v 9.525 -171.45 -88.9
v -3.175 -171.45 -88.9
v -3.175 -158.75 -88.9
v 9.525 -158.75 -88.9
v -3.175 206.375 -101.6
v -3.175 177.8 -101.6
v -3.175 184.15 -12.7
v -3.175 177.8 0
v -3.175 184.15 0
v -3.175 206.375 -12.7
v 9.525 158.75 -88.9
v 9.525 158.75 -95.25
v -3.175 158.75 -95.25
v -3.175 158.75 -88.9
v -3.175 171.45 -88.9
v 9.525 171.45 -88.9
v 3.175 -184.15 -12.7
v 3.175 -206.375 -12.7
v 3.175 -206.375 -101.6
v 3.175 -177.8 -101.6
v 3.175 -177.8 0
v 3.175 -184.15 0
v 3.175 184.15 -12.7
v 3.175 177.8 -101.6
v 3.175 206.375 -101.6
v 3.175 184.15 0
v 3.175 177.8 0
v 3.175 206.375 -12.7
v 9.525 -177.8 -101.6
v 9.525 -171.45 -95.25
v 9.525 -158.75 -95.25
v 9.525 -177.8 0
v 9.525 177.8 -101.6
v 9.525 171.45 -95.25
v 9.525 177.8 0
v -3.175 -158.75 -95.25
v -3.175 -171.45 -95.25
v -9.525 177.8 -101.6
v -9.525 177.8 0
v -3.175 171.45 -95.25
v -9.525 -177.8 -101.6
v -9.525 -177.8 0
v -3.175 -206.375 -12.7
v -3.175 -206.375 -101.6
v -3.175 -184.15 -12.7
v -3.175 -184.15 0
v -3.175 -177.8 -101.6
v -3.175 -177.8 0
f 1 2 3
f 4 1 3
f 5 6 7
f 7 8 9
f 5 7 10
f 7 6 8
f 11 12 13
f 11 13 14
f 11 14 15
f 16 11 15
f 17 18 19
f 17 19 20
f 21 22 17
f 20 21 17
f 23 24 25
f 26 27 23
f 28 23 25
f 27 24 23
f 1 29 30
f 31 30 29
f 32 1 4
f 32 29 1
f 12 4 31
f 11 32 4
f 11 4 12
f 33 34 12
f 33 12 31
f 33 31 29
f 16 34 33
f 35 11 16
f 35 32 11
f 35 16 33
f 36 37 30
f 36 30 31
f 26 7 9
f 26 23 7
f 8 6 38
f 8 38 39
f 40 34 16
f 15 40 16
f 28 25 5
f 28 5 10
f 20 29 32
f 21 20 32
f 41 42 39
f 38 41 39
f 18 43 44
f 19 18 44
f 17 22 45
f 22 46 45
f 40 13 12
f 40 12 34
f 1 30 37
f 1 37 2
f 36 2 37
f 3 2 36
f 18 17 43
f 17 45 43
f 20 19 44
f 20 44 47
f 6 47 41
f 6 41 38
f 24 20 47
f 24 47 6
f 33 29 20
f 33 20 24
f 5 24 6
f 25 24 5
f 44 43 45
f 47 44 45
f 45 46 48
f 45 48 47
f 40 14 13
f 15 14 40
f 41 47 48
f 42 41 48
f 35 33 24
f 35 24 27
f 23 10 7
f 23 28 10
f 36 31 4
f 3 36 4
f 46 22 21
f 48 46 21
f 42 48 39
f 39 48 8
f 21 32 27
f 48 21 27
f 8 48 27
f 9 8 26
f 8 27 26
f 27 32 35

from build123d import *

# Parameters (mm, degrees)
F0_W     = 355.6
F0_H     = 101.6
F1_DEPTH = 9.525
F2_DEPTH = 3.175
F3_W     = 12.7
F3_H     = 6.35
F4_DEPTH = 12.7


# Not quite as in the source:
# - a feature names something its author has since deleted; it is built from what else it names


with BuildPart() as f1:
    # F0 (on Right) → F1 (new body, symmetric)
    with BuildSketch(Plane.YZ):
        with Locations((0, -50.8)):
            Rectangle(F0_W, F0_H)
    extrude(amount=F1_DEPTH, both=True)

    # F0 (on Right) → F2 (join, symmetric)
    with BuildSketch(Plane.YZ):
        Polygon((-177.8, -101.6), (-177.8, 0), (-184.15, 0), (-184.15, -12.7), (-206.375, -12.7), (-206.375, -101.6), align=None)
        Polygon((184.15, 0), (177.8, 0), (177.8, -101.6), (206.375, -101.6), (206.375, -12.7), (184.15, -12.7), align=None)
    extrude(amount=F2_DEPTH, both=True)

    # F3 (on face) → F4 (cut)
    with BuildSketch(Plane.YZ.offset(9.525)):
        with Locations((-165.1, -92.075)):
            Rectangle(F3_W, F3_H)
        with Locations((165.1, -92.075)):
            Rectangle(F3_W, F3_H)
    extrude(amount=-F4_DEPTH, mode=Mode.SUBTRACT)


solid = f1.part
